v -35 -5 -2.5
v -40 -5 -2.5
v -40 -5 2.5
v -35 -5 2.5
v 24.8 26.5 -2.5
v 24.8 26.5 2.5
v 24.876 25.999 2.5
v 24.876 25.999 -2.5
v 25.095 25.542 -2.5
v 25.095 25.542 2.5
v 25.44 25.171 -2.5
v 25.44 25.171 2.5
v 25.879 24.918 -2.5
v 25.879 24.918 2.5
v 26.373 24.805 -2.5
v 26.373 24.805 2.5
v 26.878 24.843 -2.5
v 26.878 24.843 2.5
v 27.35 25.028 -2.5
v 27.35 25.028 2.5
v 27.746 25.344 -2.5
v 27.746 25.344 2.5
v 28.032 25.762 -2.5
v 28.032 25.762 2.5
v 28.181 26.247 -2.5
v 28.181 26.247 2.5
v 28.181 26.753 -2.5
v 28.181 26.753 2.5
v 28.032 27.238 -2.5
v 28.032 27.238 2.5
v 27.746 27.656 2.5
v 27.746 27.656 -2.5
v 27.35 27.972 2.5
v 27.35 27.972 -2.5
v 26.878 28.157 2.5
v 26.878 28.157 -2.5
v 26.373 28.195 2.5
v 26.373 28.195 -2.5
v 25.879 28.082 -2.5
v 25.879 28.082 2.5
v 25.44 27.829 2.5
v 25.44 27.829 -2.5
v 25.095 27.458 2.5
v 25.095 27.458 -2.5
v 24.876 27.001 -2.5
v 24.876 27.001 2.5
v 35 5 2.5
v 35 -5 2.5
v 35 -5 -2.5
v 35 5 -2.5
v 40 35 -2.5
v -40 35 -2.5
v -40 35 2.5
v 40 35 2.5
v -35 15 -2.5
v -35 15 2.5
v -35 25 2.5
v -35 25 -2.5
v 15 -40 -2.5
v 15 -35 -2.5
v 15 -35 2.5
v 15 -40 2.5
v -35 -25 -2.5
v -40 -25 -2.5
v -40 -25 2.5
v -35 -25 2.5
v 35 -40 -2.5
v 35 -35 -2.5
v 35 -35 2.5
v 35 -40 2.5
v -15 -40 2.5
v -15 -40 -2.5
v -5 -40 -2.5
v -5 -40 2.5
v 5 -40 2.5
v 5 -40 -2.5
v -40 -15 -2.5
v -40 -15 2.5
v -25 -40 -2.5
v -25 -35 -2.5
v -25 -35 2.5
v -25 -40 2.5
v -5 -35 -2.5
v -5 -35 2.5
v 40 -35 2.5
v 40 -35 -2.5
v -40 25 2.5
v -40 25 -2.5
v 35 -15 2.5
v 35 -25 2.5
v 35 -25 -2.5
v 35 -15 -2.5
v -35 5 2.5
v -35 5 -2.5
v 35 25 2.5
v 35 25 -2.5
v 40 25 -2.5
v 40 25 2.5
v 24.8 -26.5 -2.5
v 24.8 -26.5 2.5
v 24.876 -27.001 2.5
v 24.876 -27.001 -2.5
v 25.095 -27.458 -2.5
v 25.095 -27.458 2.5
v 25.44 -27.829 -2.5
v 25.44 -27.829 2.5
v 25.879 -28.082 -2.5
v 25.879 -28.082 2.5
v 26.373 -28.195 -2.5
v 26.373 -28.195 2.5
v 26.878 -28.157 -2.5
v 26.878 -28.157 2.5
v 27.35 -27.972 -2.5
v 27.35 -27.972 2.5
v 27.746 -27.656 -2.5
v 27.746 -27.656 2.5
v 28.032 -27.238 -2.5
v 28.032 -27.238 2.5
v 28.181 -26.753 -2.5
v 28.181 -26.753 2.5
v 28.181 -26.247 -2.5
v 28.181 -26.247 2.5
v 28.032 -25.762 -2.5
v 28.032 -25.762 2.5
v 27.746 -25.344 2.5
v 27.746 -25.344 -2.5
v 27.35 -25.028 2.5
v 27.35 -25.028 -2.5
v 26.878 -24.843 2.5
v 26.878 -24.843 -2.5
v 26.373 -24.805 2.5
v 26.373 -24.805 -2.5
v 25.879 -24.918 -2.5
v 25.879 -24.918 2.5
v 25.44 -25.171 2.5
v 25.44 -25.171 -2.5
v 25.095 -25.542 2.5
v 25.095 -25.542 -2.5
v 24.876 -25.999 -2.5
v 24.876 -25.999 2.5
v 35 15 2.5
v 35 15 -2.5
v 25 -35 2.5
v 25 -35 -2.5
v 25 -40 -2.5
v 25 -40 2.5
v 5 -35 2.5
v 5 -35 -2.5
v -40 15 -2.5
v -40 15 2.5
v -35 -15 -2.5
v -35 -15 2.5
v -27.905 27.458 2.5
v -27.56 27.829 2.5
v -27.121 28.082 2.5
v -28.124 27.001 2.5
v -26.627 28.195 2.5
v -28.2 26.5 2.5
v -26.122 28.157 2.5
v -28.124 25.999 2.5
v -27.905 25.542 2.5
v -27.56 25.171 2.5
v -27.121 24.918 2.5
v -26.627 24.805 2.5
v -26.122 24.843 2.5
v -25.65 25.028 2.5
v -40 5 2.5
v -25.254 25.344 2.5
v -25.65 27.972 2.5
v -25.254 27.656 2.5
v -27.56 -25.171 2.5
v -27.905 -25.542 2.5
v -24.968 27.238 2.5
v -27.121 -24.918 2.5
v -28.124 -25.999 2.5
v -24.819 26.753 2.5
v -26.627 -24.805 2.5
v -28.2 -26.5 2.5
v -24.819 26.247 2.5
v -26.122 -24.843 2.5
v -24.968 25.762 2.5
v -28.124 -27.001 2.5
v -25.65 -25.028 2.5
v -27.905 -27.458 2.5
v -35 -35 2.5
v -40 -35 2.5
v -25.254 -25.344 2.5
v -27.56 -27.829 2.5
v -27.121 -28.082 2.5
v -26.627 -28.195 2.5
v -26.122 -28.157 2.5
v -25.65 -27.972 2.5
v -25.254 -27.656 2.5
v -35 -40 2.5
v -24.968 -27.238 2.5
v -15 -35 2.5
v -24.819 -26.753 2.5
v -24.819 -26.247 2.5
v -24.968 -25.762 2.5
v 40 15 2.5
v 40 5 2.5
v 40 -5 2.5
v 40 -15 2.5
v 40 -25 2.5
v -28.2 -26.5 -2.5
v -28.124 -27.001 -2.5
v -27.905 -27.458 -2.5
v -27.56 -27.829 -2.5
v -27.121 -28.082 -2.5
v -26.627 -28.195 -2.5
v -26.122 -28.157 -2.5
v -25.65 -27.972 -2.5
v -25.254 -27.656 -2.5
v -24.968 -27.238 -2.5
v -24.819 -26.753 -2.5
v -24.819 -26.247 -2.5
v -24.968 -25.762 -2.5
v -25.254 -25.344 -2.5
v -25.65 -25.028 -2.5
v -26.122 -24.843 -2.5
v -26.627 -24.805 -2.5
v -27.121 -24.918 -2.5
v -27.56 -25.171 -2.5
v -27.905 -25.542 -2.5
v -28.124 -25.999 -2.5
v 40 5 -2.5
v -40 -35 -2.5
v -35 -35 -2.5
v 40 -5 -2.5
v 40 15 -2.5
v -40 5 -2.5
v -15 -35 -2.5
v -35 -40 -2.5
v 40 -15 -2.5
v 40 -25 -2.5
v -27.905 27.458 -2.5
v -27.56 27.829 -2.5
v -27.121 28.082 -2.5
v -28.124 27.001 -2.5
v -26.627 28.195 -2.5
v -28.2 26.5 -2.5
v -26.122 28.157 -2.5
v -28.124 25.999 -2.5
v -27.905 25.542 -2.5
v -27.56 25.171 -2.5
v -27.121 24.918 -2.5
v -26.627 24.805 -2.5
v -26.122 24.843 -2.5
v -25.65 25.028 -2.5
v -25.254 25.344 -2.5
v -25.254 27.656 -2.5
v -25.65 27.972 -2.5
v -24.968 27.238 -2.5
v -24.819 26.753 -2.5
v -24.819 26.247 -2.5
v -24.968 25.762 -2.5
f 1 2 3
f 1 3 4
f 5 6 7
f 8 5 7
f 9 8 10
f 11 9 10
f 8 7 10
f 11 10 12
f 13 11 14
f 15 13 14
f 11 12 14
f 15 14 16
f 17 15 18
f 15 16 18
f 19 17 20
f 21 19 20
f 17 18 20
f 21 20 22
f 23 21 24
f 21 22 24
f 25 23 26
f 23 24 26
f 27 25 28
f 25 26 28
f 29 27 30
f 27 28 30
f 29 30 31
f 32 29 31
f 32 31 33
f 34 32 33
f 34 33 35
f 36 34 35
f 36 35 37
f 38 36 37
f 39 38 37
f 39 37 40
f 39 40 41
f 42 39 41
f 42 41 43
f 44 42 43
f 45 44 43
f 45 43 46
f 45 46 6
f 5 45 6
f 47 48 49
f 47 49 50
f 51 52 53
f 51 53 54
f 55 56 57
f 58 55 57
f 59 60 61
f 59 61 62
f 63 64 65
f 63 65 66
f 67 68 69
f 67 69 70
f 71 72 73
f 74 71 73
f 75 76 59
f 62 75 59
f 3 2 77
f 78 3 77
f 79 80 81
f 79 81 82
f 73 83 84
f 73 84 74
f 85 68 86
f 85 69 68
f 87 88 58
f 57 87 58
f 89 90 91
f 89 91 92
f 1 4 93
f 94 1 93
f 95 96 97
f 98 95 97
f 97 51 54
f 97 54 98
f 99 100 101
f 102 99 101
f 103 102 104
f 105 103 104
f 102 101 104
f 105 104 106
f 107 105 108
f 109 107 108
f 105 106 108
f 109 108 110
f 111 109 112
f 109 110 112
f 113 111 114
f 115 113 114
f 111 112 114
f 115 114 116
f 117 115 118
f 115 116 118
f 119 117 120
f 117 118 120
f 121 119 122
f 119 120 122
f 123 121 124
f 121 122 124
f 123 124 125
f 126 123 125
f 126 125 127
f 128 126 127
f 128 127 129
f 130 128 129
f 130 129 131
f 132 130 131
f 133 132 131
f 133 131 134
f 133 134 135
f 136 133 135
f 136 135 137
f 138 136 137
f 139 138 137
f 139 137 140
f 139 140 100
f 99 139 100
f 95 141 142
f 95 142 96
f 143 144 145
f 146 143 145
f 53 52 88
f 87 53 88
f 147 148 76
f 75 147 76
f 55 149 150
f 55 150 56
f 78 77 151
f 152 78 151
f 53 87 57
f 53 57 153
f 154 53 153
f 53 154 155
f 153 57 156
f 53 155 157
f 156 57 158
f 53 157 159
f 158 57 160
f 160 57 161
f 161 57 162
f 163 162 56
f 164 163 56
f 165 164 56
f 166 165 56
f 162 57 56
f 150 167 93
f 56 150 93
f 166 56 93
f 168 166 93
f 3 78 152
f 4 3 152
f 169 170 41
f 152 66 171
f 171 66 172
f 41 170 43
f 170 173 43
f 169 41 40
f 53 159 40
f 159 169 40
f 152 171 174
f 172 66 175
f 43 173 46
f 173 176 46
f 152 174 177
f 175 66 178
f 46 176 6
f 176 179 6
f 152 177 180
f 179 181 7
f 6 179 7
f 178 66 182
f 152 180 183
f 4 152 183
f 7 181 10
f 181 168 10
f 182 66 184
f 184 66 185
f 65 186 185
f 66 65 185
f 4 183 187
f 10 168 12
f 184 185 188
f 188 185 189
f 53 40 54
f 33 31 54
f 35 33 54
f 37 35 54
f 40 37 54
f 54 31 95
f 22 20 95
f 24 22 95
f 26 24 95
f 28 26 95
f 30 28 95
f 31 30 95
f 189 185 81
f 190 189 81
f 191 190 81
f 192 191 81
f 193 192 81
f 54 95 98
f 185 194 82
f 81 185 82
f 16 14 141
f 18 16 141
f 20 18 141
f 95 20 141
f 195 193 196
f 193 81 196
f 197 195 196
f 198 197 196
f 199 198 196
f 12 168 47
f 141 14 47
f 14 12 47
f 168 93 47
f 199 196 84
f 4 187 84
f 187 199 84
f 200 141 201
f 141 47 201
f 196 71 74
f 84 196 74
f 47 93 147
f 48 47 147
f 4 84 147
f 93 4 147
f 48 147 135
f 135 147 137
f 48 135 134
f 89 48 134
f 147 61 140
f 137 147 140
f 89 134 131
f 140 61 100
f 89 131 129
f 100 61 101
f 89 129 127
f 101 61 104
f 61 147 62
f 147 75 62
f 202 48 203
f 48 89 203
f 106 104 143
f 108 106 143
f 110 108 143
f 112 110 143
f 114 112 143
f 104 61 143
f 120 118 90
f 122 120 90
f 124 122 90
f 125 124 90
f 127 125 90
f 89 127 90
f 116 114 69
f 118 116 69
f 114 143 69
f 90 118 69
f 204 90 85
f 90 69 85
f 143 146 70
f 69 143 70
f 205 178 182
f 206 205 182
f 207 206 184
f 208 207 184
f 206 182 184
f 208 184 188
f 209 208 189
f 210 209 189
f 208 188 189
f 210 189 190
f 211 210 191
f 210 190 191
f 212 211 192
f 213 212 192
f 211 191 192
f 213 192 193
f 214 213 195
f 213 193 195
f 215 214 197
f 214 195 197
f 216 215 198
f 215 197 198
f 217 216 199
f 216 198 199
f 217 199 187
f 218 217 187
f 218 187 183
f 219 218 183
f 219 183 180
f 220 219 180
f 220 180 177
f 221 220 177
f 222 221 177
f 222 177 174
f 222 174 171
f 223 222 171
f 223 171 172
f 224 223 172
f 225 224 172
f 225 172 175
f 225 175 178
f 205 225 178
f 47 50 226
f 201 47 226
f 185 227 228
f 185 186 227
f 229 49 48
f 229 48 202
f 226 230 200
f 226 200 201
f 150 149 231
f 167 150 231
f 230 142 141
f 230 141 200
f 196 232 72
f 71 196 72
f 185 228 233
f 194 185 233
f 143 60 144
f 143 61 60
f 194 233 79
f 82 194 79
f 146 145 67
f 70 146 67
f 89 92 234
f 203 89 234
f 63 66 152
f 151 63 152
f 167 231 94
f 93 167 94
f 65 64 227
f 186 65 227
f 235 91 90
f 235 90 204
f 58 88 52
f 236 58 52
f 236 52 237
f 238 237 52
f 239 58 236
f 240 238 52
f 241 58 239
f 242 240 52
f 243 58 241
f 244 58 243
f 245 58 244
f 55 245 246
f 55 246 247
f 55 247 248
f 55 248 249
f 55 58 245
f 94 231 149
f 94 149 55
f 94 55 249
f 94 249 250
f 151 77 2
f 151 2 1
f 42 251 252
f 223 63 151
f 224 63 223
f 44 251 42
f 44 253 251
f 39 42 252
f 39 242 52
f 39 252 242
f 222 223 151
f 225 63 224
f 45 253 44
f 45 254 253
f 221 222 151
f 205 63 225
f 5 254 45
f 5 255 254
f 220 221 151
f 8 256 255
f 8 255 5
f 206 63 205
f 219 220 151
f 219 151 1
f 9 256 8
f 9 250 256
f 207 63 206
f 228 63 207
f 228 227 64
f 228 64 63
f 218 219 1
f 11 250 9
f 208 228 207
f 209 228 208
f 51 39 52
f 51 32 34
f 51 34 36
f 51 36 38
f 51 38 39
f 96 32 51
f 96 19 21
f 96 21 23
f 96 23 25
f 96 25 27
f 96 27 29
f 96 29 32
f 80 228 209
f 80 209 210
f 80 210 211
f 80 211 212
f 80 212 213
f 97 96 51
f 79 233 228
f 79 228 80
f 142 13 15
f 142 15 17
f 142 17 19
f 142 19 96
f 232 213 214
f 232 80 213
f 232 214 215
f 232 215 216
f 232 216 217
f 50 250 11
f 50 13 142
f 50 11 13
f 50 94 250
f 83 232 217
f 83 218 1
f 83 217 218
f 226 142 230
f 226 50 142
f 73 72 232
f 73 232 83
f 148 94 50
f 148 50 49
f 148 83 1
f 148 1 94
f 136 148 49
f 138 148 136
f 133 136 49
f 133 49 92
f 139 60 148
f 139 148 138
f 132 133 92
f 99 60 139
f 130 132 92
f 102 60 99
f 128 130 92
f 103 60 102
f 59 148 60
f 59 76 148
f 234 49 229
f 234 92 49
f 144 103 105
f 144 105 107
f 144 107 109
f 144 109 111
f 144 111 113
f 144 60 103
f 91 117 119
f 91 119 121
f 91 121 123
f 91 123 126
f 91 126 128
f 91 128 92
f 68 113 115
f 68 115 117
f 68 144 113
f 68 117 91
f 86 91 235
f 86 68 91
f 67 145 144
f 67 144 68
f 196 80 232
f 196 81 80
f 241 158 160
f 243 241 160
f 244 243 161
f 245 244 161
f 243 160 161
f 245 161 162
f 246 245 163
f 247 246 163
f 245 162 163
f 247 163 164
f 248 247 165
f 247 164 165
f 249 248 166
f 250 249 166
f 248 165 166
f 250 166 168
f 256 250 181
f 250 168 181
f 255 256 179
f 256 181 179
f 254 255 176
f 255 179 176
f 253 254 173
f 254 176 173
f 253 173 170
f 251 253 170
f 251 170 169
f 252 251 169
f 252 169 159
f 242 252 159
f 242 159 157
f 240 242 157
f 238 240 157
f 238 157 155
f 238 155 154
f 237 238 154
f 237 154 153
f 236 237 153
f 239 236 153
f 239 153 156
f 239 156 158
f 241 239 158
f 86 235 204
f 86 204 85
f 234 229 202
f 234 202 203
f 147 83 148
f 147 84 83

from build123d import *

# Parameters (mm, degrees)
F0_W     = 70
F0_H     = 70
F1_DEPTH = 2.5
F2_W     = 5
F2_H     = 10
F3_DEPTH = 5
F4_W     = 10
F4_H     = 5
F5_DEPTH = 5
F7_D     = 3.4


with BuildPart() as f1:
    # F0 (on Top) → F1 (new body, symmetric)
    with BuildSketch(Plane.XY):
        Rectangle(F0_W, F0_H)
    extrude(amount=F1_DEPTH, both=True)

    # F2 (on face) → F3 (join, through all)
    with BuildSketch(Plane(origin=(0, 0, -2.5), x_dir=(1, 0, 0), z_dir=(0, 0, -1))):
        with Locations((-37.5, -30)):
            Rectangle(F2_W, F2_H)
        with Locations((37.5, -30)):
            Rectangle(F2_W, F2_H)
        with Locations((37.5, -10)):
            Rectangle(F2_W, F2_H)
        with Locations((-37.5, -10)):
            Rectangle(F2_W, F2_H)
        with Locations((37.5, 10)):
            Rectangle(F2_W, F2_H)
        with Locations((-37.5, 10)):
            Rectangle(F2_W, F2_H)
        with Locations((37.5, 30)):
            Rectangle(F2_W, F2_H)
        with Locations((-37.5, 30)):
            Rectangle(F2_W, F2_H)
    extrude(amount=-F3_DEPTH)

    # F4 (on face) → F5 (join, through all)
    with BuildSketch(Plane(origin=(0, 0, -2.5), x_dir=(1, 0, 0), z_dir=(0, 0, -1))):
        with Locations((-30, 37.5)):
            Rectangle(F4_W, F4_H)
        with Locations((-10, 37.5)):
            Rectangle(F4_W, F4_H)
        with Locations((10, 37.5)):
            Rectangle(F4_W, F4_H)
        with Locations((30, 37.5)):
            Rectangle(F4_W, F4_H)
    extrude(amount=-F5_DEPTH)

    # F7 (through all)
    with Locations(Plane(origin=(0, 0, -2.5), x_dir=(1, 0, 0), z_dir=(0, 0, -1))):
        with Locations((-26.5, 26.5), (26.5, 26.5), (26.5, -26.5), (-26.5, -26.5)):
            Hole(F7_D / 2)


solid = f1.part
